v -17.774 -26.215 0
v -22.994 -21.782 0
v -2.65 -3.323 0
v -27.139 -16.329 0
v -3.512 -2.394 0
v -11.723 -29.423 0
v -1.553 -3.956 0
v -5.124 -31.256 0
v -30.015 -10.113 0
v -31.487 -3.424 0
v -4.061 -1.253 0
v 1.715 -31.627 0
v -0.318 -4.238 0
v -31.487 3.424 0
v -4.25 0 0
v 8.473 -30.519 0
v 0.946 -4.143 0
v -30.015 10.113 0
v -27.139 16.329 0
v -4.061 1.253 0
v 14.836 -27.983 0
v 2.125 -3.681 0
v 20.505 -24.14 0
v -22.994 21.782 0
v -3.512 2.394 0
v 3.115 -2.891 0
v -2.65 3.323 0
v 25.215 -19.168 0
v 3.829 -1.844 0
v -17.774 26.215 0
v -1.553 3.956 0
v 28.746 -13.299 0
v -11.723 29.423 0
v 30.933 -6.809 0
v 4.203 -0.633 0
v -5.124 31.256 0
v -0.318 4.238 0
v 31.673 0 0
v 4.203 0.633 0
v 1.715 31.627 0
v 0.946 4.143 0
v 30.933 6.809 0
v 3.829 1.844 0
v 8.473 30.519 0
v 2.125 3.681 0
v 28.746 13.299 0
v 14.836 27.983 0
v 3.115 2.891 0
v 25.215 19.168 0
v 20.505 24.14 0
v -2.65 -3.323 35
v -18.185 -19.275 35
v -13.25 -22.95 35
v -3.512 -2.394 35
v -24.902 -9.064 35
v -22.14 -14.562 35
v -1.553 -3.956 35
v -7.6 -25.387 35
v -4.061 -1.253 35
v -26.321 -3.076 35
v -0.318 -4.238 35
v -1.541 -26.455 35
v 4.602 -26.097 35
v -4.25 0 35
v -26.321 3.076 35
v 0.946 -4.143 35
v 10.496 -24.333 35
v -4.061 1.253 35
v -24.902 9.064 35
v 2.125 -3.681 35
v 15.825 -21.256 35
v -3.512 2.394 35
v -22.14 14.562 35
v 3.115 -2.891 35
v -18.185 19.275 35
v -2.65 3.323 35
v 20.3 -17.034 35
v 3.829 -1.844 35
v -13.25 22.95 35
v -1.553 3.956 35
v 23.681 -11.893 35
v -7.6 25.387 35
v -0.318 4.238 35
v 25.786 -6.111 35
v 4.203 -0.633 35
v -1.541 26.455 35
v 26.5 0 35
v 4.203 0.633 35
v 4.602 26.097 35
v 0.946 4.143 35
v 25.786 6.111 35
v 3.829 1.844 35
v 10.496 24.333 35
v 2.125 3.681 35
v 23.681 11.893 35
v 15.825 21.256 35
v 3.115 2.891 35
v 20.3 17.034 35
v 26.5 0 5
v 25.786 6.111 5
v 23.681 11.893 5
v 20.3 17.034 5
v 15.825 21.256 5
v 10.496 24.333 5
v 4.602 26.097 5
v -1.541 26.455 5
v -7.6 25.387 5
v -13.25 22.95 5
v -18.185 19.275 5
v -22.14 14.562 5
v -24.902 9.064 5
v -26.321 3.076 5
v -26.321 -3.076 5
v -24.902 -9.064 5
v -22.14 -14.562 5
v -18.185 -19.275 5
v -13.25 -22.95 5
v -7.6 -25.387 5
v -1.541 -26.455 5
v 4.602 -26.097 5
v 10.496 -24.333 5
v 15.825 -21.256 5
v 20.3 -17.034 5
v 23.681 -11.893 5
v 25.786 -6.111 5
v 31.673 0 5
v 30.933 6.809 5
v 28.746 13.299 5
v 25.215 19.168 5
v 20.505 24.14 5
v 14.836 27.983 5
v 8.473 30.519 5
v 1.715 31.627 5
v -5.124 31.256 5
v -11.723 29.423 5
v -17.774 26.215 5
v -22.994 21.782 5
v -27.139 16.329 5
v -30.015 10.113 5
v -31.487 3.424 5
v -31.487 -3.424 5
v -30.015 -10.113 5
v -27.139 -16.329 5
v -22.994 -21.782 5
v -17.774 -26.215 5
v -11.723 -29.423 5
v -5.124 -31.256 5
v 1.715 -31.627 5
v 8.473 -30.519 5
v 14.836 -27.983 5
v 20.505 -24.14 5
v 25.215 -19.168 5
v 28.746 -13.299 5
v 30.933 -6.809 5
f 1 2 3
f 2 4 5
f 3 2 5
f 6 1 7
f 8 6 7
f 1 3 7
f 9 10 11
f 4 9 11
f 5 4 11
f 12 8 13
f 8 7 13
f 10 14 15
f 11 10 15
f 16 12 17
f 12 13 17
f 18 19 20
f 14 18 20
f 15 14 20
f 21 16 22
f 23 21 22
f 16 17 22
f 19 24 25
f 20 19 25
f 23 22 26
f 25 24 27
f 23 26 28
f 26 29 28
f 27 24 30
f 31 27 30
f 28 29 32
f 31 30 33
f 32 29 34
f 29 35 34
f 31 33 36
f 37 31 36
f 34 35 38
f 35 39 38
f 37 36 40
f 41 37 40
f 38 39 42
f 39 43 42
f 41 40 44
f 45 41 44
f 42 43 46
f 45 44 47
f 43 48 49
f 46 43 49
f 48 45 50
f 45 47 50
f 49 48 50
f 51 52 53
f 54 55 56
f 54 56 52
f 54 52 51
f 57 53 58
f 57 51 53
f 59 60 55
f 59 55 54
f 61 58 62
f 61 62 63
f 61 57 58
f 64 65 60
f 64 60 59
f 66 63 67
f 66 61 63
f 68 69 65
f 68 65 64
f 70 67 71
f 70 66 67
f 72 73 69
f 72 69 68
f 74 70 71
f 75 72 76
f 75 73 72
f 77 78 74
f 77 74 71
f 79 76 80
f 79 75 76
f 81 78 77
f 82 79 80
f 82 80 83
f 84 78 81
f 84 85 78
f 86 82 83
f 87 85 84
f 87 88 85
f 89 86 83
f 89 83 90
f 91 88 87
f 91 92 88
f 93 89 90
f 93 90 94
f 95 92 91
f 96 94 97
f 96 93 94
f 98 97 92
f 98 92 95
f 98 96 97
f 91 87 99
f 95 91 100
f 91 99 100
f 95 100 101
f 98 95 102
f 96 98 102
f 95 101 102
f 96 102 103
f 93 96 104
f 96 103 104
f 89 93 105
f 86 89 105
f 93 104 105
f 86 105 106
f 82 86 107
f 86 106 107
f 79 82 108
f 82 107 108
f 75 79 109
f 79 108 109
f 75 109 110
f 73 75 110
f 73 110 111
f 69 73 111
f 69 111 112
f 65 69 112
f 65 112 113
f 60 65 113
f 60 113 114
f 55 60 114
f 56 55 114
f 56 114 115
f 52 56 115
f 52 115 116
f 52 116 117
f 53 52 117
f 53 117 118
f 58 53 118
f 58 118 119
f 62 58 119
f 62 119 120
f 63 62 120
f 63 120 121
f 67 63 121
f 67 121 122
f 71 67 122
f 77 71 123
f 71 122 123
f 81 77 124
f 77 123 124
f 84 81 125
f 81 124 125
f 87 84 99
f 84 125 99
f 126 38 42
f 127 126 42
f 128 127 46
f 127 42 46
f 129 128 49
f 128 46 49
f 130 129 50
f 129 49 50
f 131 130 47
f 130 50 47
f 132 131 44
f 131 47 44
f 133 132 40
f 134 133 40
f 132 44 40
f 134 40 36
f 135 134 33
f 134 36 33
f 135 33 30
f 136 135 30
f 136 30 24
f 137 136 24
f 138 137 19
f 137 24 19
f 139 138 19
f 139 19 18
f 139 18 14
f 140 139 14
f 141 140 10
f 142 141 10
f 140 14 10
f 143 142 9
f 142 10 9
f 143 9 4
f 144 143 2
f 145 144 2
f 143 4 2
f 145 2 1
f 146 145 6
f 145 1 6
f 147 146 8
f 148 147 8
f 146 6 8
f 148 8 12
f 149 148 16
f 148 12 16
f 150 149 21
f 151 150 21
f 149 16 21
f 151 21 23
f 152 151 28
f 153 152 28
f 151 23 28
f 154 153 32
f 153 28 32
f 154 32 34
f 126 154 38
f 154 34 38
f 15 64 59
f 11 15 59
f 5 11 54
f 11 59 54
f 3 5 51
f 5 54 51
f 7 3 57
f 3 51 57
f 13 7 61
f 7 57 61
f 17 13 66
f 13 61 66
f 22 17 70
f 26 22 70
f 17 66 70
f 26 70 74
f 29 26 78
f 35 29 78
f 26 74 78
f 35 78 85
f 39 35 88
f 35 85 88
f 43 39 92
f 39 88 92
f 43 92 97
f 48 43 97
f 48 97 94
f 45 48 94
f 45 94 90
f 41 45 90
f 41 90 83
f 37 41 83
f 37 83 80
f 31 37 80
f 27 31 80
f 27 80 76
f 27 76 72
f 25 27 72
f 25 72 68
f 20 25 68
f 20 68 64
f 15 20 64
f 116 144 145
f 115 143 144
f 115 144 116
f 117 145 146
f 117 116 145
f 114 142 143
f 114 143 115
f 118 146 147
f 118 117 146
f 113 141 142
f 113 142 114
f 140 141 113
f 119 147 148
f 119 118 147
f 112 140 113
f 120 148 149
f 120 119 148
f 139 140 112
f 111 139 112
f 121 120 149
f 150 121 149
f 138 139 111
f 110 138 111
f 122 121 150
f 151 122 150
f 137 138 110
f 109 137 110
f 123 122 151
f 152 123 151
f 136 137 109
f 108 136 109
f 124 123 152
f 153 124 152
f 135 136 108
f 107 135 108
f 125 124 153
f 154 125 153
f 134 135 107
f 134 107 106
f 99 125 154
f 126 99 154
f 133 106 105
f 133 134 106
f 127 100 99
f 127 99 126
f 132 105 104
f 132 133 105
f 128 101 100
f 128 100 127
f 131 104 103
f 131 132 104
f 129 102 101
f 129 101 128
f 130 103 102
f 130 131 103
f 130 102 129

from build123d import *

# Parameters (mm, degrees)
F0_R     = 26.5
F1_DEPTH = 35
F0_R_2   = 31.673016
F2_DEPTH = 5
F3_D     = 8.5


with BuildPart() as f1:
    # F0 (on Top) → F1 (new body)
    with BuildSketch(Plane.XY):
        Circle(F0_R)
    extrude(amount=F1_DEPTH)

    # F0 (on Top) → F2 (join)
    with BuildSketch(Plane.XY):
        Circle(F0_R_2)
        Circle(F0_R, mode=Mode.SUBTRACT)
    extrude(amount=F2_DEPTH)

    # F3 (through all)
    with Locations(Plane(origin=(0, 0, 0), x_dir=(1, 0, 0), z_dir=(0, 0, -1))):
        with Locations((0, 0)):
            Hole(F3_D / 2)


solid = f1.part
